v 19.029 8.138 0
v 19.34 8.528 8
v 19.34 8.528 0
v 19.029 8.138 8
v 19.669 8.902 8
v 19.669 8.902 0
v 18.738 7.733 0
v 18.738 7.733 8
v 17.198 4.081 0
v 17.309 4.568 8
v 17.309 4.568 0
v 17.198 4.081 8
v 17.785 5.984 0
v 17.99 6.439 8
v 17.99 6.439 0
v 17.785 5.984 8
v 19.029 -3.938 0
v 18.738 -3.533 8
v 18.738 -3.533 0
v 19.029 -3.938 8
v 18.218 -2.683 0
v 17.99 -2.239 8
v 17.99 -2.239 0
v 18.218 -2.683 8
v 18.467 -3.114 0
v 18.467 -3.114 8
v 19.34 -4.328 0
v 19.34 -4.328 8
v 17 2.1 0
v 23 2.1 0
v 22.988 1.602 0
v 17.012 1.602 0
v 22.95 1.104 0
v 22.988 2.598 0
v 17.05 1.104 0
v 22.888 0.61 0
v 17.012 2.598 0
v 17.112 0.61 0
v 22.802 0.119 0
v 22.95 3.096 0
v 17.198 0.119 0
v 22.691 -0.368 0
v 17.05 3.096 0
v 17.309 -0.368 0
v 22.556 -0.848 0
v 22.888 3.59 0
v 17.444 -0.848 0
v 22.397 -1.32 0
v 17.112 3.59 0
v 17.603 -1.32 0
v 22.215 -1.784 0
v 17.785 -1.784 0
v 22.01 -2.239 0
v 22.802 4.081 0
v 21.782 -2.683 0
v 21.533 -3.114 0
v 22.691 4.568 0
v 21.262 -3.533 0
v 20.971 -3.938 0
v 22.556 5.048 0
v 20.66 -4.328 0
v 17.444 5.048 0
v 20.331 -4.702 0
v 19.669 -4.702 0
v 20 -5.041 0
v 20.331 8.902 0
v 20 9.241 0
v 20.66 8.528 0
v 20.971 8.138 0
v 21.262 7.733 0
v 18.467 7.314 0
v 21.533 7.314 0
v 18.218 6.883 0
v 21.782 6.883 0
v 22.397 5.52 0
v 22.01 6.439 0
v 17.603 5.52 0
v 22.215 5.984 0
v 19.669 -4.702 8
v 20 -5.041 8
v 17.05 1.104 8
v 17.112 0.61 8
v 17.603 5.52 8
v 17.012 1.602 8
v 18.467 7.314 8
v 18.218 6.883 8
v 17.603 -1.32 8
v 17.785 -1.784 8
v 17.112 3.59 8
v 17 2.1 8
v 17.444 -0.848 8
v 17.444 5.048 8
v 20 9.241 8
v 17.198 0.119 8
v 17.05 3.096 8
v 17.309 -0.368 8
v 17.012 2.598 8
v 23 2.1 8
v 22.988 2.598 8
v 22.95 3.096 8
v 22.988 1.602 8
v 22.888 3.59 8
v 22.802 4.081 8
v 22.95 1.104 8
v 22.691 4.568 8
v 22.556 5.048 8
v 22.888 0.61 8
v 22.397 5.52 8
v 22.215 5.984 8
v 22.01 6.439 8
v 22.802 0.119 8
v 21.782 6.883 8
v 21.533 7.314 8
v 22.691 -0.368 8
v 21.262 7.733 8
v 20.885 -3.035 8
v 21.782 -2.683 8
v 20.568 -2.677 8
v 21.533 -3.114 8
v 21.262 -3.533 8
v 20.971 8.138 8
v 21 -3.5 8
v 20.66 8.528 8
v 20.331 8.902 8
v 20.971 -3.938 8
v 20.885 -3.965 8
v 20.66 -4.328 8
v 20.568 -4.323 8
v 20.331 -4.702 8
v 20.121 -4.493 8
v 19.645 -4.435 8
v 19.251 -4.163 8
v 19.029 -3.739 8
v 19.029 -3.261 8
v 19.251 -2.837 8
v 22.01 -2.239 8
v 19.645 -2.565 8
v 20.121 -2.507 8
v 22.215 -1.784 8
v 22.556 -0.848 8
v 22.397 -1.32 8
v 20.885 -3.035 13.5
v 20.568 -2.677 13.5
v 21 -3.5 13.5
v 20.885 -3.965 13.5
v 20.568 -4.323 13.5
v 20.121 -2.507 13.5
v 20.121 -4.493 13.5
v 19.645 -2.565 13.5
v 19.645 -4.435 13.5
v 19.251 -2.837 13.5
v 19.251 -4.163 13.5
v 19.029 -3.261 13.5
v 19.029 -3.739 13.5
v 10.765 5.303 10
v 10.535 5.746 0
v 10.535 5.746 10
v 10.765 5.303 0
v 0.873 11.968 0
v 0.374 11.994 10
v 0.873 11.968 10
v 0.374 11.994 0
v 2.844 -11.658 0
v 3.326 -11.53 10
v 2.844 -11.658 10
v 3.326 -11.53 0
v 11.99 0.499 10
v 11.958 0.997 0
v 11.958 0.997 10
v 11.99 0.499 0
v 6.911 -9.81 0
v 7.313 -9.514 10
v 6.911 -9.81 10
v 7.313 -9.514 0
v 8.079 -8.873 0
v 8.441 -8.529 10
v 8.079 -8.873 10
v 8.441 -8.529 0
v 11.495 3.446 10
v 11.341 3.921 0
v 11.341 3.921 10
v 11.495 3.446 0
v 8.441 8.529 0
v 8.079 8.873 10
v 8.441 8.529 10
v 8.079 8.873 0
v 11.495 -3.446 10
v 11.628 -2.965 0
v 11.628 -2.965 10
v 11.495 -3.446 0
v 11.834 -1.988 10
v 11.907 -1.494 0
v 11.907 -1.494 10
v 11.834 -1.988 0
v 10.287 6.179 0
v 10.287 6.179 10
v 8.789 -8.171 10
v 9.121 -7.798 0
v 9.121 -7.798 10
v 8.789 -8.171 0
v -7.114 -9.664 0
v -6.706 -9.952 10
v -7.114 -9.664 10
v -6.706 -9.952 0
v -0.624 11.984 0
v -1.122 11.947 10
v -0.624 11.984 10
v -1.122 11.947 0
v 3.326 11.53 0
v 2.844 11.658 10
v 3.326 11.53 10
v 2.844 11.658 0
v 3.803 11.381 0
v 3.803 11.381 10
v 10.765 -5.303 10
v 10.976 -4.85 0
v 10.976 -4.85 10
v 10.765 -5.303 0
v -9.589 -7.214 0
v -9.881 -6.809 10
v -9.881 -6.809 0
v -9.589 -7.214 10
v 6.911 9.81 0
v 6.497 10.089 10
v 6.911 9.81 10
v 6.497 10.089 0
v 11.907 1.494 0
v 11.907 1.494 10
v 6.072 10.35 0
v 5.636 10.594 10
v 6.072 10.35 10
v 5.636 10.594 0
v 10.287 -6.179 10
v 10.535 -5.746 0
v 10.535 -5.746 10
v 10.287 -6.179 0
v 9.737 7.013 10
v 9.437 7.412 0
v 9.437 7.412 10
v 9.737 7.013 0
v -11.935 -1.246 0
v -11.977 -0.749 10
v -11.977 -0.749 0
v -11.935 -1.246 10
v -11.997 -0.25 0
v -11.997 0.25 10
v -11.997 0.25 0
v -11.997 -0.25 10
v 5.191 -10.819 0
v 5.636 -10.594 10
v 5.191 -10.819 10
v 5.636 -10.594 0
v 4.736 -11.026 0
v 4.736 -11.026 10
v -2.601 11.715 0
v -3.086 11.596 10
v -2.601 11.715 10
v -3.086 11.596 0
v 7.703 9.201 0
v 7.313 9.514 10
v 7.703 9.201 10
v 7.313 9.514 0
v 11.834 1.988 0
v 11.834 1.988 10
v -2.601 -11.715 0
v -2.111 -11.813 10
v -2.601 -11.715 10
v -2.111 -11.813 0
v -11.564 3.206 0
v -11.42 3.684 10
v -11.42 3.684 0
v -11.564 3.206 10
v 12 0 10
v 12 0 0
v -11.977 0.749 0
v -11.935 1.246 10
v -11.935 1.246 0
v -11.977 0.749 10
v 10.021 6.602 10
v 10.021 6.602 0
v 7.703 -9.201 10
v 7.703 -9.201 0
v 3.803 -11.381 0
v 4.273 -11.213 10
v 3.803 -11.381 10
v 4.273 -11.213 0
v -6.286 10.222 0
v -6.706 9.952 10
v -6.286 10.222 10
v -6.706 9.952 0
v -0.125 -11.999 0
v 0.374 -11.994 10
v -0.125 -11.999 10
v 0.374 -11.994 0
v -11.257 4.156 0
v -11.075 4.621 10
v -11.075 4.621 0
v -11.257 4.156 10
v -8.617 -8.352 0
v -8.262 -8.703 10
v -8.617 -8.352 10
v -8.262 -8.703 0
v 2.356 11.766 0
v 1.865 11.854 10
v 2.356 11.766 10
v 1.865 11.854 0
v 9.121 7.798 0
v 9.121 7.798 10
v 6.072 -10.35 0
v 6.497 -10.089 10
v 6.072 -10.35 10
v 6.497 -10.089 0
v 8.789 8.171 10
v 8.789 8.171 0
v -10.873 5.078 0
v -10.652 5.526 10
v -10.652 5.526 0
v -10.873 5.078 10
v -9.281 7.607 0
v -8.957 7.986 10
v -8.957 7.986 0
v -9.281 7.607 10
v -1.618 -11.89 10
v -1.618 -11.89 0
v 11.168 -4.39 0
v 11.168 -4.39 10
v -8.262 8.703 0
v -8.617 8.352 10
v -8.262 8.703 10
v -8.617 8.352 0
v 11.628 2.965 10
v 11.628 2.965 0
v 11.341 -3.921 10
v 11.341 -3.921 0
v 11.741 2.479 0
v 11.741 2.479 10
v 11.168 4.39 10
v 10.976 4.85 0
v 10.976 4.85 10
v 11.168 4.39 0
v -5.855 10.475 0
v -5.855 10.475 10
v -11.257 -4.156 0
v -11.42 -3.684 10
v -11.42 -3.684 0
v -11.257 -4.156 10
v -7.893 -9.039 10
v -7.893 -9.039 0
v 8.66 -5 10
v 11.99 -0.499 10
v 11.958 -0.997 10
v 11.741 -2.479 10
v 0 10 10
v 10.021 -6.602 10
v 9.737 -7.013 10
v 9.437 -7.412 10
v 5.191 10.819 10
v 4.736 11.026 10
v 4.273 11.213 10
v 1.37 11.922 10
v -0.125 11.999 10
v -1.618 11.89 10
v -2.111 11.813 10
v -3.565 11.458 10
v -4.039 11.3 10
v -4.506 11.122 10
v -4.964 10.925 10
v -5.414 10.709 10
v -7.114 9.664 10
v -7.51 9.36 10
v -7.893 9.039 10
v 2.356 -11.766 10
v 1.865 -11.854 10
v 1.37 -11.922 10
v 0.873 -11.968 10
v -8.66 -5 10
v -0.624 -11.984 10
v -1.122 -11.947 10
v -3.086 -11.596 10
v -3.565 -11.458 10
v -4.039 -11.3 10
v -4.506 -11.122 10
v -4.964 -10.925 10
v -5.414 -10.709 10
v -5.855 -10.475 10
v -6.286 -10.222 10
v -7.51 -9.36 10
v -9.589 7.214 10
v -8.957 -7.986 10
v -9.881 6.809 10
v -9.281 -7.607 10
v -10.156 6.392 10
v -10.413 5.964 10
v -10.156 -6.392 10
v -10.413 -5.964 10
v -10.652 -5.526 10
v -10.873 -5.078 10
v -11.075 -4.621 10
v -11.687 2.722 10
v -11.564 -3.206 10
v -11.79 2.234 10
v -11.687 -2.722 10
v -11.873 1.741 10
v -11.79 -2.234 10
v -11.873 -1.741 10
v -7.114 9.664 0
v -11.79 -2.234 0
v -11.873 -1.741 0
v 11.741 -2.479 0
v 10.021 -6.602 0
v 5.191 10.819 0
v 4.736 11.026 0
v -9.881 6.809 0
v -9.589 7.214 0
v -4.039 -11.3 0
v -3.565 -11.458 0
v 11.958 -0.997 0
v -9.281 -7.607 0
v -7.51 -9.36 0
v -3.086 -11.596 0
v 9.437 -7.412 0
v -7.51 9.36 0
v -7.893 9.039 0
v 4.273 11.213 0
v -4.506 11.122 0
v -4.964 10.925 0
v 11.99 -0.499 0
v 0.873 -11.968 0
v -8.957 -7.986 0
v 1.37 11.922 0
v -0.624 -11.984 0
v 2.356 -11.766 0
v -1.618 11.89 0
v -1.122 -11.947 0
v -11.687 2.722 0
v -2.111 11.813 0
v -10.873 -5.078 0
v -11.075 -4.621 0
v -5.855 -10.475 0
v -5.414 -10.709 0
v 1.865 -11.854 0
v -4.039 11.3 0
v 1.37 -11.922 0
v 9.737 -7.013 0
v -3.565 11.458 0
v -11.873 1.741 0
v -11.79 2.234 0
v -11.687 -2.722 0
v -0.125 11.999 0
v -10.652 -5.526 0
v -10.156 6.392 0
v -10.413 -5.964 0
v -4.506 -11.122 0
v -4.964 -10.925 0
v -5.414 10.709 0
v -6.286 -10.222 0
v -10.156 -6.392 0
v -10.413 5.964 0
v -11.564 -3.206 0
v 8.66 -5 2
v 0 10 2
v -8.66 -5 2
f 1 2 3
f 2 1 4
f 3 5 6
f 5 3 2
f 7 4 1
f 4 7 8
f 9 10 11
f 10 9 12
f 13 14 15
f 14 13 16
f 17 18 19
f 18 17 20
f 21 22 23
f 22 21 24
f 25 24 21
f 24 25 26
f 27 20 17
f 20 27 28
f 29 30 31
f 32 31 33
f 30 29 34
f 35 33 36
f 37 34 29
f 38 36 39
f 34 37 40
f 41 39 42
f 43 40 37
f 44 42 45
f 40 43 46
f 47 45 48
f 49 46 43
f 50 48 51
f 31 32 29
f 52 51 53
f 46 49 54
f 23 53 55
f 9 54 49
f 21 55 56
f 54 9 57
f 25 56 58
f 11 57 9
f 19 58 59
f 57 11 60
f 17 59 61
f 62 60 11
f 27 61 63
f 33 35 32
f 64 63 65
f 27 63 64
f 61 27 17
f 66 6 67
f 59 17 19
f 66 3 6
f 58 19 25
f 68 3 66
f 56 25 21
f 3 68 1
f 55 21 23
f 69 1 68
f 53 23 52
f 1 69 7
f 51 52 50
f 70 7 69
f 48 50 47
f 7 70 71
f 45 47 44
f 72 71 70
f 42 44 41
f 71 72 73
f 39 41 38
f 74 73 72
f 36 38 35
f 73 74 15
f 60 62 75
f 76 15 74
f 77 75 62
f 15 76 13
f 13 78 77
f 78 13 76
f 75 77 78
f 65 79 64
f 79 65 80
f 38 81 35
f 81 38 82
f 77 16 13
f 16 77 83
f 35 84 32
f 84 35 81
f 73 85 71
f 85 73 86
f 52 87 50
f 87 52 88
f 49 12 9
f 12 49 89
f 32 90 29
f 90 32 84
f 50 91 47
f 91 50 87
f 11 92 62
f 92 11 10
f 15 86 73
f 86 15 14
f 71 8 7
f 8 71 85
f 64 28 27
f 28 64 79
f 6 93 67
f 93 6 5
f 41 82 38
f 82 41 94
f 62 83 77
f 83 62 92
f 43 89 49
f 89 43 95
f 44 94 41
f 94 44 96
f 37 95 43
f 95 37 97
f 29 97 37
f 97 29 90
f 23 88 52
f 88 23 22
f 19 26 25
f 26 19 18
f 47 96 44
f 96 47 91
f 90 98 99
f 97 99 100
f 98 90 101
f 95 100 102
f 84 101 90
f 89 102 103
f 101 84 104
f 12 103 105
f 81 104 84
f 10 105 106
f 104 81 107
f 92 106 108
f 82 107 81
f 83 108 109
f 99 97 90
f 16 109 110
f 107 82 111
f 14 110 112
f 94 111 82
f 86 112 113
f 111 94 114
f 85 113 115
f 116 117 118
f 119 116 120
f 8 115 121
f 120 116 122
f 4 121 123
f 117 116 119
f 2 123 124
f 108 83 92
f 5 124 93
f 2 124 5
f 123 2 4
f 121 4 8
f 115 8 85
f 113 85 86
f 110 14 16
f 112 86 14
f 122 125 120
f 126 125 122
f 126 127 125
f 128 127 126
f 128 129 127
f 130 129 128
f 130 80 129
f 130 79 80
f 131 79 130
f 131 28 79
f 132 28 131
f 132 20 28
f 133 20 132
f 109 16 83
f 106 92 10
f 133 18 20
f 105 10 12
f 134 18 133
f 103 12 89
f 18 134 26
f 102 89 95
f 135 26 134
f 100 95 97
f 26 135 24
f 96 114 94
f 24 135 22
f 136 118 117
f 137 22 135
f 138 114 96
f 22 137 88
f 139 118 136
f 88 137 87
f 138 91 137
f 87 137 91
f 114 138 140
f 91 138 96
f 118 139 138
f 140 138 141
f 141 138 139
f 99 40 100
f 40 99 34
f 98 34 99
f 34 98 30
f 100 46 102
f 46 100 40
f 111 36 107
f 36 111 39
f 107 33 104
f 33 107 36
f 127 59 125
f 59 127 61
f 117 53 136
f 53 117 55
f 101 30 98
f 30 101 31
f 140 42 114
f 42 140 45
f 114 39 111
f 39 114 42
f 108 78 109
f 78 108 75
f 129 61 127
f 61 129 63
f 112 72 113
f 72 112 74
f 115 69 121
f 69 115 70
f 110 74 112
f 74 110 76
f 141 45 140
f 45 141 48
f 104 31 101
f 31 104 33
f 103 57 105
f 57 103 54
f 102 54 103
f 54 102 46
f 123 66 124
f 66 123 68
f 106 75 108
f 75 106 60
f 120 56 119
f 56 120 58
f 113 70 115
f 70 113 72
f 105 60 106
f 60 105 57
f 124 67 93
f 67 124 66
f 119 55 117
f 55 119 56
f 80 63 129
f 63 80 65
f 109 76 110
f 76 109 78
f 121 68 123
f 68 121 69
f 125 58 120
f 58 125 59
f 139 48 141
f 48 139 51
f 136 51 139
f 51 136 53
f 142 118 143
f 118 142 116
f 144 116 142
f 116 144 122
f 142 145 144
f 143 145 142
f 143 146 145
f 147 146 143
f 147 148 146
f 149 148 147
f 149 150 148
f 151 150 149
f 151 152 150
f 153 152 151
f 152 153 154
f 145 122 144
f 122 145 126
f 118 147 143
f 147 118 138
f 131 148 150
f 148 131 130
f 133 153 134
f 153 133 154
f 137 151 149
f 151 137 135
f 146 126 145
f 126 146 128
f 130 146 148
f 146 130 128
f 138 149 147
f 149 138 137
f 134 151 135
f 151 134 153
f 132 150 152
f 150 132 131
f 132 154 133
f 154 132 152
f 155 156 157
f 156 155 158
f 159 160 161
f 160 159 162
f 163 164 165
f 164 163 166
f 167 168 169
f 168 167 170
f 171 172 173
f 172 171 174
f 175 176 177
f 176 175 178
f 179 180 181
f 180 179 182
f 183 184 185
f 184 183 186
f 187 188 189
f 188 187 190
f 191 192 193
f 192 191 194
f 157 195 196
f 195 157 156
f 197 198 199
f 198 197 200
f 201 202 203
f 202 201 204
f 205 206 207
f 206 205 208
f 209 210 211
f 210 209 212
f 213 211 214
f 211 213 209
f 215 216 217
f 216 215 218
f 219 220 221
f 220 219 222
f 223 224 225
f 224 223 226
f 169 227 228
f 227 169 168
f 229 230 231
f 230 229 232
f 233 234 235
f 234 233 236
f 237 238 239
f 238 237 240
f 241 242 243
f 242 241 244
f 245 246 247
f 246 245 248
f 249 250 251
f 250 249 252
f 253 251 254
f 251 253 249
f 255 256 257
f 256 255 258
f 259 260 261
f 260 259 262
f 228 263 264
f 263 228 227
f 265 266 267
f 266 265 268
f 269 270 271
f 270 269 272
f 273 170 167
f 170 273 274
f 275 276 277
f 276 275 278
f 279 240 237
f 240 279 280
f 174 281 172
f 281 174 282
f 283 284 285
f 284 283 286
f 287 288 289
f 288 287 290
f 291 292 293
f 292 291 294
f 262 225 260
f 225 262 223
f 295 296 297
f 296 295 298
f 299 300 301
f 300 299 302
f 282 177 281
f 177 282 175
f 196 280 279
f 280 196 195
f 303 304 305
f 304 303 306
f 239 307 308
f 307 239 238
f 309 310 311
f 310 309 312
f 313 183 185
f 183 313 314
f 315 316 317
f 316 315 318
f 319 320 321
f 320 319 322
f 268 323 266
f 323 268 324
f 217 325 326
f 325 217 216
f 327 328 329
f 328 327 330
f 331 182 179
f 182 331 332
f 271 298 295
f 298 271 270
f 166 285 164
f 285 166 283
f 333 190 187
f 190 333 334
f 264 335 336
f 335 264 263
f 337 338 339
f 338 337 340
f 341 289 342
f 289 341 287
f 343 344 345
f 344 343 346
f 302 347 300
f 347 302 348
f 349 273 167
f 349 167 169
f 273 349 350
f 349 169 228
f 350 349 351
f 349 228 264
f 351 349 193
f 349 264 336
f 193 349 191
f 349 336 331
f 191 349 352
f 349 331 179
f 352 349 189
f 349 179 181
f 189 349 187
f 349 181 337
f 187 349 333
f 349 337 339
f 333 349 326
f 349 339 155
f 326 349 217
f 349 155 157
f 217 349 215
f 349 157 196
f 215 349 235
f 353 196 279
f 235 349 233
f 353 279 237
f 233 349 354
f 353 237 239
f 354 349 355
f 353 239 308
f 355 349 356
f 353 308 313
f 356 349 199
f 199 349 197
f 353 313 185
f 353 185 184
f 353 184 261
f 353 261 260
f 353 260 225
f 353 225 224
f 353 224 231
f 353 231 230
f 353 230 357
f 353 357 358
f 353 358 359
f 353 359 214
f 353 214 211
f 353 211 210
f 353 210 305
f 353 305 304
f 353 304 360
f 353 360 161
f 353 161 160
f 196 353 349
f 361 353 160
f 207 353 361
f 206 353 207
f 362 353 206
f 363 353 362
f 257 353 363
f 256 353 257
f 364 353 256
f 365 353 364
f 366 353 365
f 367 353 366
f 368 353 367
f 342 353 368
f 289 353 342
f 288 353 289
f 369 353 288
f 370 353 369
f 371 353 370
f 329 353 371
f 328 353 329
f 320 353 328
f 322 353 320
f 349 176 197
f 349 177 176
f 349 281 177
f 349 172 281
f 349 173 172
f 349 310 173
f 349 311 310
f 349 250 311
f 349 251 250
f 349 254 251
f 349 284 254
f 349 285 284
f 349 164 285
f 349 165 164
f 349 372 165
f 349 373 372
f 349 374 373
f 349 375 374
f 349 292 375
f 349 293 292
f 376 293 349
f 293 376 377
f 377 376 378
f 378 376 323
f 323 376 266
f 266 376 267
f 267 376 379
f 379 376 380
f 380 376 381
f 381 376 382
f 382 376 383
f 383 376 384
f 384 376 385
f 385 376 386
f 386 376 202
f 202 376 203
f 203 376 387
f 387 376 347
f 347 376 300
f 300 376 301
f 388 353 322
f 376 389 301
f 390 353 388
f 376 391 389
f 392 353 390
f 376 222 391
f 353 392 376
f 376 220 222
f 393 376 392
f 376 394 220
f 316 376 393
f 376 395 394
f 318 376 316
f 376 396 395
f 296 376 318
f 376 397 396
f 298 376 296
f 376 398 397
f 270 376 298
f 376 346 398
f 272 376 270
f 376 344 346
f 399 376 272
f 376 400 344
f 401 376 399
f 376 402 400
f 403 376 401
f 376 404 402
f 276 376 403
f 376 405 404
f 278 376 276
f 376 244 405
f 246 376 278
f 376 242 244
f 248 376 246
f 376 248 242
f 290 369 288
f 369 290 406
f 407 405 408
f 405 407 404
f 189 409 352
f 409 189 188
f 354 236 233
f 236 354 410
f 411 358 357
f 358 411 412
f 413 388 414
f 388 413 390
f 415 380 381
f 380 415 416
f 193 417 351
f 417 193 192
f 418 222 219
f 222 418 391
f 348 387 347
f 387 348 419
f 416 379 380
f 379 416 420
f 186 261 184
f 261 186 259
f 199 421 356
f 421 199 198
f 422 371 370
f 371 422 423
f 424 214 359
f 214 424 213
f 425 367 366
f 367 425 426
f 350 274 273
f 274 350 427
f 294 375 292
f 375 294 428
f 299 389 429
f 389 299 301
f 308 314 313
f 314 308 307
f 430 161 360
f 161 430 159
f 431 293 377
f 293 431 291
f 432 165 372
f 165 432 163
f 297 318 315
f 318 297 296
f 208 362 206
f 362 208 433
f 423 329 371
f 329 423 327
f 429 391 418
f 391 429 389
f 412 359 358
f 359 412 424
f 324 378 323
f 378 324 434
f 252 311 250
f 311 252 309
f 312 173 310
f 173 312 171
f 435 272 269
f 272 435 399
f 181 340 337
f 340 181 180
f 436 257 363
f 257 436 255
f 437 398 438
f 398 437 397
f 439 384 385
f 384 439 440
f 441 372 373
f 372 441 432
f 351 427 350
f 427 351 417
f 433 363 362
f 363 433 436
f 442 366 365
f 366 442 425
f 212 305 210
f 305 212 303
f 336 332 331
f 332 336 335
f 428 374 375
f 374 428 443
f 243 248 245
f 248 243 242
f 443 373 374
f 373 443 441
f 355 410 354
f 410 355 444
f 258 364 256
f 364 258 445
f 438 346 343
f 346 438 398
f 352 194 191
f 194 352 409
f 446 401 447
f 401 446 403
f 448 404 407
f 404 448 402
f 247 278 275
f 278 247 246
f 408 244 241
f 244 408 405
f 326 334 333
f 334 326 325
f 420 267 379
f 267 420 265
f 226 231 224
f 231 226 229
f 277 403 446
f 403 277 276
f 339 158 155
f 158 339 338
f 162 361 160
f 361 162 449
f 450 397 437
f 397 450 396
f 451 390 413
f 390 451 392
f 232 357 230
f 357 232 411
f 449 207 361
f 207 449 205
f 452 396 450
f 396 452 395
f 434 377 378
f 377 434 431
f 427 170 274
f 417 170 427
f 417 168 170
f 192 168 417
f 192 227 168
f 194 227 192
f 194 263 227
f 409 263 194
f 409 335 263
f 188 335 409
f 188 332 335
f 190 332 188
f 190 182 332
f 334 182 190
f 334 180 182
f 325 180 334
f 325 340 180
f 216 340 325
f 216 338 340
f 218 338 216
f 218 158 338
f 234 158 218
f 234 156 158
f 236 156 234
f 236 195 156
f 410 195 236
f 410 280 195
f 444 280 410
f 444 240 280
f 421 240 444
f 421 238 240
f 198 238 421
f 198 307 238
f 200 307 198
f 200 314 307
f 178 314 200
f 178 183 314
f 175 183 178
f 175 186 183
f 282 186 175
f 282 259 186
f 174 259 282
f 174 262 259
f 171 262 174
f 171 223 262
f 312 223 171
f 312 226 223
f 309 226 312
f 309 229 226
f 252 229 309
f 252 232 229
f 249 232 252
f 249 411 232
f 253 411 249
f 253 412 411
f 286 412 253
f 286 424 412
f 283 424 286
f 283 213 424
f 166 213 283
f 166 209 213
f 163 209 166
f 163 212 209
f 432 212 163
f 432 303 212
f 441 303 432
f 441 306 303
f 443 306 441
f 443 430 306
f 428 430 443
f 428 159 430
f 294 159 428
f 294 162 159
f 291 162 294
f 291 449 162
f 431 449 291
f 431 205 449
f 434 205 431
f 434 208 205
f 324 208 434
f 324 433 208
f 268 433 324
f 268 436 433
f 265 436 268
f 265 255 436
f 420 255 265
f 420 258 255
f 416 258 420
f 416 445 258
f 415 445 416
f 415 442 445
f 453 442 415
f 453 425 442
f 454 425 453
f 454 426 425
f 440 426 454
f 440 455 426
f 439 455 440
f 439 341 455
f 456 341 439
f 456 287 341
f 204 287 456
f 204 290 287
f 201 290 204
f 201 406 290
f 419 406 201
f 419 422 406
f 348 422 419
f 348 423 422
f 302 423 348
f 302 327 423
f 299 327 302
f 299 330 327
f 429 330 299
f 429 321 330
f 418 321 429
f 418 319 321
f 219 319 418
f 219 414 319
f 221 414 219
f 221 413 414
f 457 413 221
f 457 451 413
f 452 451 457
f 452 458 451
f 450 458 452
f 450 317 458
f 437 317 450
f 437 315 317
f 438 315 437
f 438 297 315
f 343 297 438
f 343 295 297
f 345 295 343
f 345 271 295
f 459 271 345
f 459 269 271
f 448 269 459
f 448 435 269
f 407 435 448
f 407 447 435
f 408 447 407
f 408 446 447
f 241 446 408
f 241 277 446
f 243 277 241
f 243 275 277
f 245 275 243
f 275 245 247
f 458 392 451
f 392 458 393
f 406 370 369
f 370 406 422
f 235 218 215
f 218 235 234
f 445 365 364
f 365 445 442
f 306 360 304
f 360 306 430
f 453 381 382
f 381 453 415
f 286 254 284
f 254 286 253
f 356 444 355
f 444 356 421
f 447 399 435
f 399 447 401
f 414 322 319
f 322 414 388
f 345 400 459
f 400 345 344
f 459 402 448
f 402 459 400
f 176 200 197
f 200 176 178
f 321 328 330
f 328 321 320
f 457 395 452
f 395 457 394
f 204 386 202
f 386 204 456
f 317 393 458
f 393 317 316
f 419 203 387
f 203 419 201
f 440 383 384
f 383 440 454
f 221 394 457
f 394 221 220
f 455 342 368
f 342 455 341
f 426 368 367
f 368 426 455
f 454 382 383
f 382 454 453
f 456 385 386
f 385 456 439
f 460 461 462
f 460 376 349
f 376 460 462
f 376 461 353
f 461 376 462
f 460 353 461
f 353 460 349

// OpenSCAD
/*
Durangle in an equilateral traingle
http://kmoddl.library.cornell.edu/model.php?m=4

*/

module durangle(r,x,h) {
    intersection () {
       translate([r-x,0,0]) cylinder(r=r,h=h);
       translate([-(r-x),0,0]) cylinder(r=r,h=h);
   }
}



$fa = 0.01;
$fs = 0.5; 

union () {
  // duangle and handle 
  translate ([20,0,0]) 
    union() {                    
        translate([0,2.1,0]) durangle(10,3,8); 
        translate([0,-3.5,7.5 ]) cylinder(r=1,h=6);
    }
  // equilateral cavity
  difference() {
      cylinder(r=12, h=10);
          translate([0,0,2]) linear_extrude(height=12) polygon(  
                  [[0.0, 10.0], 
                  [8.6602540378443873, -4.9999999999999982],
                  [-8.6602540378443837, -5.0000000000000044]
          ]);
   }
}
